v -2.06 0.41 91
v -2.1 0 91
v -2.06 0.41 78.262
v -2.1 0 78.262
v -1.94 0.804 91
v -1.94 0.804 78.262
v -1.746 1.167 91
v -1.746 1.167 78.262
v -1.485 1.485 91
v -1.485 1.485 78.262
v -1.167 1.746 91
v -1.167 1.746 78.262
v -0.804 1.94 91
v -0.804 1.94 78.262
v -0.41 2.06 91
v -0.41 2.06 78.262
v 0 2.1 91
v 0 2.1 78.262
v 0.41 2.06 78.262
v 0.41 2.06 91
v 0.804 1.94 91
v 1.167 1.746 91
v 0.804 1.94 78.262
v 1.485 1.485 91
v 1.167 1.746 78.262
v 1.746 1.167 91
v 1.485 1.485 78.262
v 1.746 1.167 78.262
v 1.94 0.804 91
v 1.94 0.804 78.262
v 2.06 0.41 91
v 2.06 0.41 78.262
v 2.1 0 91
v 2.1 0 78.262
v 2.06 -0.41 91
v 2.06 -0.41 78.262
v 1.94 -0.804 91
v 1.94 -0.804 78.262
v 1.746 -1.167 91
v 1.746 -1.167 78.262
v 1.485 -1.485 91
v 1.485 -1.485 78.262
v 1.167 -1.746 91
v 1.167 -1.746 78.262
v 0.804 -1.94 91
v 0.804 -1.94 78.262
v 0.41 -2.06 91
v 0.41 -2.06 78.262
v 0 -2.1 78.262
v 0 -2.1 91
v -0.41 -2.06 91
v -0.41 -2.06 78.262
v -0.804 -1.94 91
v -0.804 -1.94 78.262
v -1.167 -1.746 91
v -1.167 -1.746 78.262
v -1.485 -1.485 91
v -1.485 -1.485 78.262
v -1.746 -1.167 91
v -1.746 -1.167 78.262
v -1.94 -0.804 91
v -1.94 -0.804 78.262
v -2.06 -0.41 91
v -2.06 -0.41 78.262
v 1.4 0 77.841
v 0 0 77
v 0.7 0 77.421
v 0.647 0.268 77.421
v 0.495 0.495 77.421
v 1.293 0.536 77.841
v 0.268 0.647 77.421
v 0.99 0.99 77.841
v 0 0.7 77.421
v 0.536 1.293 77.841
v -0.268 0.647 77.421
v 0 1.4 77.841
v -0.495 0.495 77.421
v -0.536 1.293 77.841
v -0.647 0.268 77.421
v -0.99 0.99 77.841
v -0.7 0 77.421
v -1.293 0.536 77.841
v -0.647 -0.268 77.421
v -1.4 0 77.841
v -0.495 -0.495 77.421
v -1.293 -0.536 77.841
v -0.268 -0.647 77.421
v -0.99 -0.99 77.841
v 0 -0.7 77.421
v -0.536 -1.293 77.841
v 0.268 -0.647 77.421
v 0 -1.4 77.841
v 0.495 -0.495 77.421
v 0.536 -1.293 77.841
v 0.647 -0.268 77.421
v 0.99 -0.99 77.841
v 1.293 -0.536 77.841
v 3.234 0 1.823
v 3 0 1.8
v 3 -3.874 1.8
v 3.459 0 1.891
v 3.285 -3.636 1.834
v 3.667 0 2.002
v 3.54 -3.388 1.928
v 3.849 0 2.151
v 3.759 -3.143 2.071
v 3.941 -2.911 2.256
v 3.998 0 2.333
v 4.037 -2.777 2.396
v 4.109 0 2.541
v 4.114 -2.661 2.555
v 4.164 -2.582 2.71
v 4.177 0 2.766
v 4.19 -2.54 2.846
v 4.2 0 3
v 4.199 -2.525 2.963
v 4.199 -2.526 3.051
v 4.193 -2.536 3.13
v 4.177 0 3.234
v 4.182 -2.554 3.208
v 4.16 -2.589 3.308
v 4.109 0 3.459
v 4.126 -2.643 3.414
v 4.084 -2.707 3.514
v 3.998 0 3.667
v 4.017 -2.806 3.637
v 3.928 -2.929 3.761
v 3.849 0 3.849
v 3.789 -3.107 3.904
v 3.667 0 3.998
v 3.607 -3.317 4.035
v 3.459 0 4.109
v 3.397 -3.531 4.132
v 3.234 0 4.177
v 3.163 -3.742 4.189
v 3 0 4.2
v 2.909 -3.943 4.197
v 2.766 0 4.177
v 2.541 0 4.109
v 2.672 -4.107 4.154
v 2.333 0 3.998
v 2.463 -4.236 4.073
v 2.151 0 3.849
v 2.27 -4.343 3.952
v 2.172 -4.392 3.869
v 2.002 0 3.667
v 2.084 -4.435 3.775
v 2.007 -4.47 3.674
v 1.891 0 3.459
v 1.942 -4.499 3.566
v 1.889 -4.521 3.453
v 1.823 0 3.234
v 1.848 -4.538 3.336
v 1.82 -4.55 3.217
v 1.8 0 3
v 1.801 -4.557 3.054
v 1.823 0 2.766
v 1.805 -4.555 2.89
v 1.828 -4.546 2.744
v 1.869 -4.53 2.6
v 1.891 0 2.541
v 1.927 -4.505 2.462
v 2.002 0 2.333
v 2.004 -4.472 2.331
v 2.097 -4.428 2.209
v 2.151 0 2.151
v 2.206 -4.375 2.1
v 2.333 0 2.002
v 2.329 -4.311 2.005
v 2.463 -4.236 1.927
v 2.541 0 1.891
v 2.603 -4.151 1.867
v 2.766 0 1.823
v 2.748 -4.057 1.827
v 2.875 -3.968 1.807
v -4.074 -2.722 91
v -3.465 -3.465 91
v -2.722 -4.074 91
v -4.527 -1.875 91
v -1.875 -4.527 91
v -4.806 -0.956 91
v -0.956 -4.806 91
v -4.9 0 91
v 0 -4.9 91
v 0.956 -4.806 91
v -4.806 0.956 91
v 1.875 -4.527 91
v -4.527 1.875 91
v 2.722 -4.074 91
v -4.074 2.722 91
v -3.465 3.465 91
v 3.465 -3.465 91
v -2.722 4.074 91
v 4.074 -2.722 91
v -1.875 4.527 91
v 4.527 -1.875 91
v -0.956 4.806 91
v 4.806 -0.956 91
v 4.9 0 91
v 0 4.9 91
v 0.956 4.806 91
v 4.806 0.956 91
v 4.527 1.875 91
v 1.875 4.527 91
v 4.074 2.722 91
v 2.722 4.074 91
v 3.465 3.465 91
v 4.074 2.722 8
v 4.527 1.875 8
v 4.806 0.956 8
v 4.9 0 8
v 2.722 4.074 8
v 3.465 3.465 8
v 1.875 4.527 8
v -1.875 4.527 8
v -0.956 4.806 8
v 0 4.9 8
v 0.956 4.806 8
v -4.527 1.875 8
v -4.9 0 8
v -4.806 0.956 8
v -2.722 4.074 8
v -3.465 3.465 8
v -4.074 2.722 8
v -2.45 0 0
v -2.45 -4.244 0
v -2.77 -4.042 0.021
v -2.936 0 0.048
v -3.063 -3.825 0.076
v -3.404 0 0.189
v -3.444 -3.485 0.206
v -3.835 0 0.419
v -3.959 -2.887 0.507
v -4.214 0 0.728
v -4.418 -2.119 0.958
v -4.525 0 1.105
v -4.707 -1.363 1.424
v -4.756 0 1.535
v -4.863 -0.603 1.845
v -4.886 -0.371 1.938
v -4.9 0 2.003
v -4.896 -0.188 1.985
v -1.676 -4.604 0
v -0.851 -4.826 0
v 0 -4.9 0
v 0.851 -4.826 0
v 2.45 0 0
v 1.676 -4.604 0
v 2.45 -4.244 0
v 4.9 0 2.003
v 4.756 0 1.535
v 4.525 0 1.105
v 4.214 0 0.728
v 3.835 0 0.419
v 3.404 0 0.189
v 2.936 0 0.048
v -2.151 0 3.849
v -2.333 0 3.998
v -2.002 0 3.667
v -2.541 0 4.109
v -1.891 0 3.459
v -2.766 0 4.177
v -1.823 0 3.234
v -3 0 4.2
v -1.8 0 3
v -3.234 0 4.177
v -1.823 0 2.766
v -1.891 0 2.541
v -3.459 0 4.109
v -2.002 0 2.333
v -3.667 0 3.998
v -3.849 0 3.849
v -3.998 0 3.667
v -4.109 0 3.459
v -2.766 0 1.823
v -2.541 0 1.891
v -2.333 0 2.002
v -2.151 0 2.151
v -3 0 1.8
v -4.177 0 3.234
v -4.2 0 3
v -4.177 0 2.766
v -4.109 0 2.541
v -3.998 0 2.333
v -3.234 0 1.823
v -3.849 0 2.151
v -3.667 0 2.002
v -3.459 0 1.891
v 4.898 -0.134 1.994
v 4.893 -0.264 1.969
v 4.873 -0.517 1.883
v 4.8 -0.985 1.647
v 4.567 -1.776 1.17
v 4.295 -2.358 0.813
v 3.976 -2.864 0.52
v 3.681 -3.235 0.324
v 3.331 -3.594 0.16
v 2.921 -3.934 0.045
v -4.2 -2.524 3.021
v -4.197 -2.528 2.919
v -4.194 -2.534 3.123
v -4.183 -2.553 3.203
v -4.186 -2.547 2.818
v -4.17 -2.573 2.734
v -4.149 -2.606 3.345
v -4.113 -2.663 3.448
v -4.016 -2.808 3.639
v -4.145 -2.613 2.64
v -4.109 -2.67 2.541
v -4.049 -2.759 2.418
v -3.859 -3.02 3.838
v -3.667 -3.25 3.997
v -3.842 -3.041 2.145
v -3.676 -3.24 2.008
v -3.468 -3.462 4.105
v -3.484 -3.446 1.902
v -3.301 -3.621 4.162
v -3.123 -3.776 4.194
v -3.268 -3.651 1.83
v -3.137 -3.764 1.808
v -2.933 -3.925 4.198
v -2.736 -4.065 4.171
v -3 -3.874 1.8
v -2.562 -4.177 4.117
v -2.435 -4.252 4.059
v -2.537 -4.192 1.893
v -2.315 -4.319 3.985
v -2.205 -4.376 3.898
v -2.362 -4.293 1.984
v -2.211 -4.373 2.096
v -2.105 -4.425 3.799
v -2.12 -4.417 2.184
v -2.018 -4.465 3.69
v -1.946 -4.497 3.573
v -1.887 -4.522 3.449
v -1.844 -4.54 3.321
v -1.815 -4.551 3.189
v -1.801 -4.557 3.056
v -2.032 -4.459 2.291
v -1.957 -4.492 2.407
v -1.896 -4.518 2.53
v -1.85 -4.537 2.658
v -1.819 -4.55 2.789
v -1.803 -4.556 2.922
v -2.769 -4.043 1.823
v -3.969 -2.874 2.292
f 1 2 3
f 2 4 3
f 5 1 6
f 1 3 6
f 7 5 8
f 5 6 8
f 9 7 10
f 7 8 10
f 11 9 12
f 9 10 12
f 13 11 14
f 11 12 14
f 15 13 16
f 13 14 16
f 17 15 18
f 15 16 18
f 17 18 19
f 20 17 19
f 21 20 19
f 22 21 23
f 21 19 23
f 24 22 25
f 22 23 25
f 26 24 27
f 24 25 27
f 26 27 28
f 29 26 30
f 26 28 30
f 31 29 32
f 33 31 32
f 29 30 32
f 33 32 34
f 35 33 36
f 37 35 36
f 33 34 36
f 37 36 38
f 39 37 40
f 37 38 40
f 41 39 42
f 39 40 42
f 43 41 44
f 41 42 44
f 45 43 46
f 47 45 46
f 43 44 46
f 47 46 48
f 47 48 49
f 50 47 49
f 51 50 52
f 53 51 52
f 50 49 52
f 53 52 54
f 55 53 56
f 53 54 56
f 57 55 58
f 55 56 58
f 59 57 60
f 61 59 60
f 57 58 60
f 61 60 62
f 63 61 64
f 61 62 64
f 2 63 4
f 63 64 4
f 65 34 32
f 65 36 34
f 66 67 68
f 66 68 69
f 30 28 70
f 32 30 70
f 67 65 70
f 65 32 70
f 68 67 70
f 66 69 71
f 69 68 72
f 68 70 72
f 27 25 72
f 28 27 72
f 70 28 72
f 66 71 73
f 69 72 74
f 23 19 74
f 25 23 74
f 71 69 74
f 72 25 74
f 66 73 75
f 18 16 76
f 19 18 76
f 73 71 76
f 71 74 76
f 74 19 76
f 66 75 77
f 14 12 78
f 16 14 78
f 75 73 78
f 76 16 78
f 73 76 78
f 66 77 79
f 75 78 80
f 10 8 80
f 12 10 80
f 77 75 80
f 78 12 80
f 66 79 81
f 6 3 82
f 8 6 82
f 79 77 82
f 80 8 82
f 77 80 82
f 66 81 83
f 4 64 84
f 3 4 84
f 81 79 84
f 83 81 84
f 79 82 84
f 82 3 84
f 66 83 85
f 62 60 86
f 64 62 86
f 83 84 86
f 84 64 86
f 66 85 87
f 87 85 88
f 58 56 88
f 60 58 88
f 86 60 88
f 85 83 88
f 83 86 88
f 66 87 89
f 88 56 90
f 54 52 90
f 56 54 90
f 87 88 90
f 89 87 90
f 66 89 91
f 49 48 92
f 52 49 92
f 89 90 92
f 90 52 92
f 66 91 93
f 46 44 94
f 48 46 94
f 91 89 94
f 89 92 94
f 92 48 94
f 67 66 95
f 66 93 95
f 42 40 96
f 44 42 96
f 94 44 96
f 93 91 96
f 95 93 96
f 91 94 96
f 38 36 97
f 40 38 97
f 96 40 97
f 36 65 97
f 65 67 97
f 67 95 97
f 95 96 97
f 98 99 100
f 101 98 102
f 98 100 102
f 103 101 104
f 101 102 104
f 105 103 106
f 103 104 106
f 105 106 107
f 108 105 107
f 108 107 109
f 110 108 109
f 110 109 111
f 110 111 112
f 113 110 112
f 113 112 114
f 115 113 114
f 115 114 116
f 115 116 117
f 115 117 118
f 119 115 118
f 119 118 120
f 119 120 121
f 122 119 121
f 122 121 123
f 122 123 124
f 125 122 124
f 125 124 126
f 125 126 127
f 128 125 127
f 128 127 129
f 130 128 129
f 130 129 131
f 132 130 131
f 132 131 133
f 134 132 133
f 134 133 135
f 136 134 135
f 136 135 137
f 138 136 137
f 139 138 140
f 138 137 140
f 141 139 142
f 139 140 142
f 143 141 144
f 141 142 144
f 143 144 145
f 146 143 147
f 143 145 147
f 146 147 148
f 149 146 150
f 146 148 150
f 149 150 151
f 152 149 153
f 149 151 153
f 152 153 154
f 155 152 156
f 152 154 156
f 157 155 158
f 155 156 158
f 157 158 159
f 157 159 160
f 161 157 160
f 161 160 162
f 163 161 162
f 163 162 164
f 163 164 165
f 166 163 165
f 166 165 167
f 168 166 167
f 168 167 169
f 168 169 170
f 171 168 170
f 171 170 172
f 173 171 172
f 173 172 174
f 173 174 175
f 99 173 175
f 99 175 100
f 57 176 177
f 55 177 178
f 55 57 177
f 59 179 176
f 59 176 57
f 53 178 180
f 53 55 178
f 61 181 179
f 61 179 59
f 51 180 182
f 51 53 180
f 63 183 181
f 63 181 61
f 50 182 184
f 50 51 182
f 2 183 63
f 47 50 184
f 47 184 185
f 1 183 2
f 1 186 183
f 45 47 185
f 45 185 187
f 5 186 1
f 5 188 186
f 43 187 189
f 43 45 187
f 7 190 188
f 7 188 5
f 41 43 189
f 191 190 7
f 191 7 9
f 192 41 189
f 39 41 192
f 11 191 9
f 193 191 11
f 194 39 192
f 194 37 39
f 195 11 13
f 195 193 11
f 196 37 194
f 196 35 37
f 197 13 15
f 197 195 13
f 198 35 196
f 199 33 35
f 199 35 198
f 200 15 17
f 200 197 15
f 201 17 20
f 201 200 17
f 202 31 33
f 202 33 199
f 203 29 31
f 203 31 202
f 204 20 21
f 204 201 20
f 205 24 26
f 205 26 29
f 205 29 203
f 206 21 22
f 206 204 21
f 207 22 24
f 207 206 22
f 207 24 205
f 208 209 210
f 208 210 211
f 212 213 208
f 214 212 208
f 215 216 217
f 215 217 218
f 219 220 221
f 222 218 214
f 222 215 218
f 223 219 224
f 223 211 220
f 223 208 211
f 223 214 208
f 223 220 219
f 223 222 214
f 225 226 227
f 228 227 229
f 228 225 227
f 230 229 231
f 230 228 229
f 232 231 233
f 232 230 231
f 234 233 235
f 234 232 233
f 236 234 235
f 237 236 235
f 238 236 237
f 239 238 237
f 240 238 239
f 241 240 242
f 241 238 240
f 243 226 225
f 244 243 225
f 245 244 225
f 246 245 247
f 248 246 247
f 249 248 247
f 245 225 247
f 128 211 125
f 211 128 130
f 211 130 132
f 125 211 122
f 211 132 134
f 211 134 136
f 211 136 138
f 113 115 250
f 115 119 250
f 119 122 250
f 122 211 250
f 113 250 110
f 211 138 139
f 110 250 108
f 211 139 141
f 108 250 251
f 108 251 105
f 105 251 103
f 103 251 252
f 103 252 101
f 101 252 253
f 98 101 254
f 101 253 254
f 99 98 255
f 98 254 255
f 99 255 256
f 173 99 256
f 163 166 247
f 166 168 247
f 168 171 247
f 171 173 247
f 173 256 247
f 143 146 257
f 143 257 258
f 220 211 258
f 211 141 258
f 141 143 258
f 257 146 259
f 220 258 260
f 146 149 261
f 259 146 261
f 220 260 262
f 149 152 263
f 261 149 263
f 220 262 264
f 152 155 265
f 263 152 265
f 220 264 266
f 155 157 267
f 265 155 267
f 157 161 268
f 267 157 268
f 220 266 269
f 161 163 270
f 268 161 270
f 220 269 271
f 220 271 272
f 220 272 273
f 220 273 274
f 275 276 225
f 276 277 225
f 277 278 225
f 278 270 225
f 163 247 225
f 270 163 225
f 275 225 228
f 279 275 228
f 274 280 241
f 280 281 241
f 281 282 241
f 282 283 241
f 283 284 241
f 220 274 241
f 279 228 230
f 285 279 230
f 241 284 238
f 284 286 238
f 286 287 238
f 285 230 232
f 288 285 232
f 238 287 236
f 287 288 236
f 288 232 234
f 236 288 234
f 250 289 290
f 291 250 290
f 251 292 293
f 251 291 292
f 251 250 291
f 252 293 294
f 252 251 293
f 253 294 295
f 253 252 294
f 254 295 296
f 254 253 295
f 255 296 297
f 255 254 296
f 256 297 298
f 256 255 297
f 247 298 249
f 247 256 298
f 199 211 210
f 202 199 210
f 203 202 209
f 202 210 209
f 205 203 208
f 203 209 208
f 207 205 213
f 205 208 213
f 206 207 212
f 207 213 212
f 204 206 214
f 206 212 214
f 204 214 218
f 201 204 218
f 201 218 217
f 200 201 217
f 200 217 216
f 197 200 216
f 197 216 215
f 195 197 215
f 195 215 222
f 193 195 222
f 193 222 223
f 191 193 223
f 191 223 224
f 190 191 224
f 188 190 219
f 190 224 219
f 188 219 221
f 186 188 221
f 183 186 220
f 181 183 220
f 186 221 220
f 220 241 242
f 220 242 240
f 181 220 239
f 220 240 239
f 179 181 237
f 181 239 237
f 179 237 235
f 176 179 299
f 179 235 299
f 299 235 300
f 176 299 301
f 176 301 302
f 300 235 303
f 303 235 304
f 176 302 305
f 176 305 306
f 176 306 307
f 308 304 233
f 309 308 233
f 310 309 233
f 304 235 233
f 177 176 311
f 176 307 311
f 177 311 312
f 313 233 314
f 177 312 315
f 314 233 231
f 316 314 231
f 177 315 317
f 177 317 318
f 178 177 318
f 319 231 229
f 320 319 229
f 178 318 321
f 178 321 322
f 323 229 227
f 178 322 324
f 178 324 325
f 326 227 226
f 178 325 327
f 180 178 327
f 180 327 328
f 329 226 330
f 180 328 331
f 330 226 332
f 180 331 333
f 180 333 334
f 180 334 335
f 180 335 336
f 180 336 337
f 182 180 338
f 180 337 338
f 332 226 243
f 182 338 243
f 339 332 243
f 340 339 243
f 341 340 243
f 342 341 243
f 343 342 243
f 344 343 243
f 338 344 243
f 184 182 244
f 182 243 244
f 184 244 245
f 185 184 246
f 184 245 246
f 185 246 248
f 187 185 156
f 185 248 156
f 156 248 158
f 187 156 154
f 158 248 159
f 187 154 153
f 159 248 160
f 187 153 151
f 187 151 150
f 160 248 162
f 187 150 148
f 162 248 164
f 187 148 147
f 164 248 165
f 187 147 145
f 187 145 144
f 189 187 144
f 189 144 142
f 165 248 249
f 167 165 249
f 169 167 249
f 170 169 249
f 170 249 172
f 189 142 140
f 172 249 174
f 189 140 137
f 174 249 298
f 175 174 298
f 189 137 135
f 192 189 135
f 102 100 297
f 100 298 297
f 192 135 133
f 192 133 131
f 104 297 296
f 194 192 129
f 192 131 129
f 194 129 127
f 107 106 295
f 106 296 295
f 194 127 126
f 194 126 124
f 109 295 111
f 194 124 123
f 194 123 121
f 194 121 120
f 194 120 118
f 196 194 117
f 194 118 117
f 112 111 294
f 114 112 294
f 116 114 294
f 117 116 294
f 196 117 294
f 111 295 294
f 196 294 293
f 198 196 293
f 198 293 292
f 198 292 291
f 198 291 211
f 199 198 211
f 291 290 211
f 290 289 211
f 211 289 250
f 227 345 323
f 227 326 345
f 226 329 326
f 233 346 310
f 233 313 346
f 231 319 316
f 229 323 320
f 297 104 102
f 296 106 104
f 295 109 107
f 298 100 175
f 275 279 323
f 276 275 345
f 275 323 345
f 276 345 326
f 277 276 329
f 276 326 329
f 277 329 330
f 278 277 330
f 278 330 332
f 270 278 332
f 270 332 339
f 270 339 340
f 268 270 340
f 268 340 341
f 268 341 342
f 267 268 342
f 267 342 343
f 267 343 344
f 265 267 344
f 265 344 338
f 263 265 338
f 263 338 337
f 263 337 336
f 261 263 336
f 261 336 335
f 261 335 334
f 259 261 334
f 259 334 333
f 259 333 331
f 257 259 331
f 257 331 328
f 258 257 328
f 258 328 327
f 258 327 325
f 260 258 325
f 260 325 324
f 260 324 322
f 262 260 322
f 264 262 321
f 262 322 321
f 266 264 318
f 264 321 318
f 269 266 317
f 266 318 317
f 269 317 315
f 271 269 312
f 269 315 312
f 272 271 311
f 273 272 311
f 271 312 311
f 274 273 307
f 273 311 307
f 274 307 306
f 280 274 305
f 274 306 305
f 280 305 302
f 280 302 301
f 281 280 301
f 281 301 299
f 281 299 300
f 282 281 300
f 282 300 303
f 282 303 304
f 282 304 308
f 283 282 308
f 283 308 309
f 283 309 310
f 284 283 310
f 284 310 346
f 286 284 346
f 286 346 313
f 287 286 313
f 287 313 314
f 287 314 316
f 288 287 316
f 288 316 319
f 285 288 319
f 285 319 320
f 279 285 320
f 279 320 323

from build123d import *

# Parameters (mm, degrees)
ESBO_O1_R                 = 4.9
RESSALTO_EXTRUS_O1_DEPTH  = 91
FURO_ROSCADO_DE_M51_D     = 4.2
FURO_ROSCADO_DE_M51_DEPTH = 12.7381927
FURO_ROSCADO_DE_M51_TIP   = 1.2618073
CORTE_EXTRUS_O1_DEPTH     = 8
CORTE_EXTRUS_O2_DEPTH     = 92.26346476
FURO_COM_FOLGA_DE_M21_D   = 2.4


with BuildPart() as part:
    # Esboço1 → Ressalto-extrusão1 (new body)
    with BuildSketch(Plane.XY):
        Circle(ESBO_O1_R)
    extrude(amount=RESSALTO_EXTRUS_O1_DEPTH)

    # Furo roscado de M51
    with Locations(Plane.XY.offset(91)):
        with Locations((0, 0)):
            Hole(FURO_ROSCADO_DE_M51_D / 2, depth=FURO_ROSCADO_DE_M51_DEPTH)
            with Locations((0, 0, -(FURO_ROSCADO_DE_M51_DEPTH + FURO_ROSCADO_DE_M51_TIP / 2))):  # 118° drill point
                Cone(0, FURO_ROSCADO_DE_M51_D / 2, FURO_ROSCADO_DE_M51_TIP, mode=Mode.SUBTRACT)

    # Esboço10 → Corte-extrusão1 (cut)
    with BuildSketch(Plane(origin=(0, 0, 0), x_dir=(-1, 0, 0), z_dir=(0, 0, -1))):
        with BuildLine():
            Line((-5, 0), (5, 0))
            ThreePointArc((5, 0), (0, 5), (-5, 0))
        make_face()
    extrude(amount=-CORTE_EXTRUS_O1_DEPTH, mode=Mode.SUBTRACT)

    # Esboço18 → Corte-extrusão2 (cut, through all)
    with BuildSketch(Plane(origin=(0, 0, 0), x_dir=(1, 0, 0), z_dir=(0, 1, 0))):
        with BuildLine():
            Line((-4.9, -2.002506281), (-4.9, 0))
            Line((-4.9, 0), (-2.45, 0))
            ThreePointArc((-2.45, 0), (-4.032129215, -0.564317395), (-4.9, -2.002506281))
        make_face()
        with BuildLine():
            Line((2.45, 0), (4.9, 0))
            Line((4.9, 0), (4.9, -2.002506281))
            ThreePointArc((4.9, -2.002506281), (4.032129215, -0.564317395), (2.45, 0))
        make_face()
    extrude(amount=-CORTE_EXTRUS_O2_DEPTH, mode=Mode.SUBTRACT)

    # Furo com folga de M21 (through all)
    with Locations(Plane(origin=(-3, 0, 3), x_dir=(0, 0, 1), z_dir=(0, 1, 0))):
        with Locations((0, 0), (0, 6)):
            Hole(FURO_COM_FOLGA_DE_M21_D / 2)


solid = part.part
